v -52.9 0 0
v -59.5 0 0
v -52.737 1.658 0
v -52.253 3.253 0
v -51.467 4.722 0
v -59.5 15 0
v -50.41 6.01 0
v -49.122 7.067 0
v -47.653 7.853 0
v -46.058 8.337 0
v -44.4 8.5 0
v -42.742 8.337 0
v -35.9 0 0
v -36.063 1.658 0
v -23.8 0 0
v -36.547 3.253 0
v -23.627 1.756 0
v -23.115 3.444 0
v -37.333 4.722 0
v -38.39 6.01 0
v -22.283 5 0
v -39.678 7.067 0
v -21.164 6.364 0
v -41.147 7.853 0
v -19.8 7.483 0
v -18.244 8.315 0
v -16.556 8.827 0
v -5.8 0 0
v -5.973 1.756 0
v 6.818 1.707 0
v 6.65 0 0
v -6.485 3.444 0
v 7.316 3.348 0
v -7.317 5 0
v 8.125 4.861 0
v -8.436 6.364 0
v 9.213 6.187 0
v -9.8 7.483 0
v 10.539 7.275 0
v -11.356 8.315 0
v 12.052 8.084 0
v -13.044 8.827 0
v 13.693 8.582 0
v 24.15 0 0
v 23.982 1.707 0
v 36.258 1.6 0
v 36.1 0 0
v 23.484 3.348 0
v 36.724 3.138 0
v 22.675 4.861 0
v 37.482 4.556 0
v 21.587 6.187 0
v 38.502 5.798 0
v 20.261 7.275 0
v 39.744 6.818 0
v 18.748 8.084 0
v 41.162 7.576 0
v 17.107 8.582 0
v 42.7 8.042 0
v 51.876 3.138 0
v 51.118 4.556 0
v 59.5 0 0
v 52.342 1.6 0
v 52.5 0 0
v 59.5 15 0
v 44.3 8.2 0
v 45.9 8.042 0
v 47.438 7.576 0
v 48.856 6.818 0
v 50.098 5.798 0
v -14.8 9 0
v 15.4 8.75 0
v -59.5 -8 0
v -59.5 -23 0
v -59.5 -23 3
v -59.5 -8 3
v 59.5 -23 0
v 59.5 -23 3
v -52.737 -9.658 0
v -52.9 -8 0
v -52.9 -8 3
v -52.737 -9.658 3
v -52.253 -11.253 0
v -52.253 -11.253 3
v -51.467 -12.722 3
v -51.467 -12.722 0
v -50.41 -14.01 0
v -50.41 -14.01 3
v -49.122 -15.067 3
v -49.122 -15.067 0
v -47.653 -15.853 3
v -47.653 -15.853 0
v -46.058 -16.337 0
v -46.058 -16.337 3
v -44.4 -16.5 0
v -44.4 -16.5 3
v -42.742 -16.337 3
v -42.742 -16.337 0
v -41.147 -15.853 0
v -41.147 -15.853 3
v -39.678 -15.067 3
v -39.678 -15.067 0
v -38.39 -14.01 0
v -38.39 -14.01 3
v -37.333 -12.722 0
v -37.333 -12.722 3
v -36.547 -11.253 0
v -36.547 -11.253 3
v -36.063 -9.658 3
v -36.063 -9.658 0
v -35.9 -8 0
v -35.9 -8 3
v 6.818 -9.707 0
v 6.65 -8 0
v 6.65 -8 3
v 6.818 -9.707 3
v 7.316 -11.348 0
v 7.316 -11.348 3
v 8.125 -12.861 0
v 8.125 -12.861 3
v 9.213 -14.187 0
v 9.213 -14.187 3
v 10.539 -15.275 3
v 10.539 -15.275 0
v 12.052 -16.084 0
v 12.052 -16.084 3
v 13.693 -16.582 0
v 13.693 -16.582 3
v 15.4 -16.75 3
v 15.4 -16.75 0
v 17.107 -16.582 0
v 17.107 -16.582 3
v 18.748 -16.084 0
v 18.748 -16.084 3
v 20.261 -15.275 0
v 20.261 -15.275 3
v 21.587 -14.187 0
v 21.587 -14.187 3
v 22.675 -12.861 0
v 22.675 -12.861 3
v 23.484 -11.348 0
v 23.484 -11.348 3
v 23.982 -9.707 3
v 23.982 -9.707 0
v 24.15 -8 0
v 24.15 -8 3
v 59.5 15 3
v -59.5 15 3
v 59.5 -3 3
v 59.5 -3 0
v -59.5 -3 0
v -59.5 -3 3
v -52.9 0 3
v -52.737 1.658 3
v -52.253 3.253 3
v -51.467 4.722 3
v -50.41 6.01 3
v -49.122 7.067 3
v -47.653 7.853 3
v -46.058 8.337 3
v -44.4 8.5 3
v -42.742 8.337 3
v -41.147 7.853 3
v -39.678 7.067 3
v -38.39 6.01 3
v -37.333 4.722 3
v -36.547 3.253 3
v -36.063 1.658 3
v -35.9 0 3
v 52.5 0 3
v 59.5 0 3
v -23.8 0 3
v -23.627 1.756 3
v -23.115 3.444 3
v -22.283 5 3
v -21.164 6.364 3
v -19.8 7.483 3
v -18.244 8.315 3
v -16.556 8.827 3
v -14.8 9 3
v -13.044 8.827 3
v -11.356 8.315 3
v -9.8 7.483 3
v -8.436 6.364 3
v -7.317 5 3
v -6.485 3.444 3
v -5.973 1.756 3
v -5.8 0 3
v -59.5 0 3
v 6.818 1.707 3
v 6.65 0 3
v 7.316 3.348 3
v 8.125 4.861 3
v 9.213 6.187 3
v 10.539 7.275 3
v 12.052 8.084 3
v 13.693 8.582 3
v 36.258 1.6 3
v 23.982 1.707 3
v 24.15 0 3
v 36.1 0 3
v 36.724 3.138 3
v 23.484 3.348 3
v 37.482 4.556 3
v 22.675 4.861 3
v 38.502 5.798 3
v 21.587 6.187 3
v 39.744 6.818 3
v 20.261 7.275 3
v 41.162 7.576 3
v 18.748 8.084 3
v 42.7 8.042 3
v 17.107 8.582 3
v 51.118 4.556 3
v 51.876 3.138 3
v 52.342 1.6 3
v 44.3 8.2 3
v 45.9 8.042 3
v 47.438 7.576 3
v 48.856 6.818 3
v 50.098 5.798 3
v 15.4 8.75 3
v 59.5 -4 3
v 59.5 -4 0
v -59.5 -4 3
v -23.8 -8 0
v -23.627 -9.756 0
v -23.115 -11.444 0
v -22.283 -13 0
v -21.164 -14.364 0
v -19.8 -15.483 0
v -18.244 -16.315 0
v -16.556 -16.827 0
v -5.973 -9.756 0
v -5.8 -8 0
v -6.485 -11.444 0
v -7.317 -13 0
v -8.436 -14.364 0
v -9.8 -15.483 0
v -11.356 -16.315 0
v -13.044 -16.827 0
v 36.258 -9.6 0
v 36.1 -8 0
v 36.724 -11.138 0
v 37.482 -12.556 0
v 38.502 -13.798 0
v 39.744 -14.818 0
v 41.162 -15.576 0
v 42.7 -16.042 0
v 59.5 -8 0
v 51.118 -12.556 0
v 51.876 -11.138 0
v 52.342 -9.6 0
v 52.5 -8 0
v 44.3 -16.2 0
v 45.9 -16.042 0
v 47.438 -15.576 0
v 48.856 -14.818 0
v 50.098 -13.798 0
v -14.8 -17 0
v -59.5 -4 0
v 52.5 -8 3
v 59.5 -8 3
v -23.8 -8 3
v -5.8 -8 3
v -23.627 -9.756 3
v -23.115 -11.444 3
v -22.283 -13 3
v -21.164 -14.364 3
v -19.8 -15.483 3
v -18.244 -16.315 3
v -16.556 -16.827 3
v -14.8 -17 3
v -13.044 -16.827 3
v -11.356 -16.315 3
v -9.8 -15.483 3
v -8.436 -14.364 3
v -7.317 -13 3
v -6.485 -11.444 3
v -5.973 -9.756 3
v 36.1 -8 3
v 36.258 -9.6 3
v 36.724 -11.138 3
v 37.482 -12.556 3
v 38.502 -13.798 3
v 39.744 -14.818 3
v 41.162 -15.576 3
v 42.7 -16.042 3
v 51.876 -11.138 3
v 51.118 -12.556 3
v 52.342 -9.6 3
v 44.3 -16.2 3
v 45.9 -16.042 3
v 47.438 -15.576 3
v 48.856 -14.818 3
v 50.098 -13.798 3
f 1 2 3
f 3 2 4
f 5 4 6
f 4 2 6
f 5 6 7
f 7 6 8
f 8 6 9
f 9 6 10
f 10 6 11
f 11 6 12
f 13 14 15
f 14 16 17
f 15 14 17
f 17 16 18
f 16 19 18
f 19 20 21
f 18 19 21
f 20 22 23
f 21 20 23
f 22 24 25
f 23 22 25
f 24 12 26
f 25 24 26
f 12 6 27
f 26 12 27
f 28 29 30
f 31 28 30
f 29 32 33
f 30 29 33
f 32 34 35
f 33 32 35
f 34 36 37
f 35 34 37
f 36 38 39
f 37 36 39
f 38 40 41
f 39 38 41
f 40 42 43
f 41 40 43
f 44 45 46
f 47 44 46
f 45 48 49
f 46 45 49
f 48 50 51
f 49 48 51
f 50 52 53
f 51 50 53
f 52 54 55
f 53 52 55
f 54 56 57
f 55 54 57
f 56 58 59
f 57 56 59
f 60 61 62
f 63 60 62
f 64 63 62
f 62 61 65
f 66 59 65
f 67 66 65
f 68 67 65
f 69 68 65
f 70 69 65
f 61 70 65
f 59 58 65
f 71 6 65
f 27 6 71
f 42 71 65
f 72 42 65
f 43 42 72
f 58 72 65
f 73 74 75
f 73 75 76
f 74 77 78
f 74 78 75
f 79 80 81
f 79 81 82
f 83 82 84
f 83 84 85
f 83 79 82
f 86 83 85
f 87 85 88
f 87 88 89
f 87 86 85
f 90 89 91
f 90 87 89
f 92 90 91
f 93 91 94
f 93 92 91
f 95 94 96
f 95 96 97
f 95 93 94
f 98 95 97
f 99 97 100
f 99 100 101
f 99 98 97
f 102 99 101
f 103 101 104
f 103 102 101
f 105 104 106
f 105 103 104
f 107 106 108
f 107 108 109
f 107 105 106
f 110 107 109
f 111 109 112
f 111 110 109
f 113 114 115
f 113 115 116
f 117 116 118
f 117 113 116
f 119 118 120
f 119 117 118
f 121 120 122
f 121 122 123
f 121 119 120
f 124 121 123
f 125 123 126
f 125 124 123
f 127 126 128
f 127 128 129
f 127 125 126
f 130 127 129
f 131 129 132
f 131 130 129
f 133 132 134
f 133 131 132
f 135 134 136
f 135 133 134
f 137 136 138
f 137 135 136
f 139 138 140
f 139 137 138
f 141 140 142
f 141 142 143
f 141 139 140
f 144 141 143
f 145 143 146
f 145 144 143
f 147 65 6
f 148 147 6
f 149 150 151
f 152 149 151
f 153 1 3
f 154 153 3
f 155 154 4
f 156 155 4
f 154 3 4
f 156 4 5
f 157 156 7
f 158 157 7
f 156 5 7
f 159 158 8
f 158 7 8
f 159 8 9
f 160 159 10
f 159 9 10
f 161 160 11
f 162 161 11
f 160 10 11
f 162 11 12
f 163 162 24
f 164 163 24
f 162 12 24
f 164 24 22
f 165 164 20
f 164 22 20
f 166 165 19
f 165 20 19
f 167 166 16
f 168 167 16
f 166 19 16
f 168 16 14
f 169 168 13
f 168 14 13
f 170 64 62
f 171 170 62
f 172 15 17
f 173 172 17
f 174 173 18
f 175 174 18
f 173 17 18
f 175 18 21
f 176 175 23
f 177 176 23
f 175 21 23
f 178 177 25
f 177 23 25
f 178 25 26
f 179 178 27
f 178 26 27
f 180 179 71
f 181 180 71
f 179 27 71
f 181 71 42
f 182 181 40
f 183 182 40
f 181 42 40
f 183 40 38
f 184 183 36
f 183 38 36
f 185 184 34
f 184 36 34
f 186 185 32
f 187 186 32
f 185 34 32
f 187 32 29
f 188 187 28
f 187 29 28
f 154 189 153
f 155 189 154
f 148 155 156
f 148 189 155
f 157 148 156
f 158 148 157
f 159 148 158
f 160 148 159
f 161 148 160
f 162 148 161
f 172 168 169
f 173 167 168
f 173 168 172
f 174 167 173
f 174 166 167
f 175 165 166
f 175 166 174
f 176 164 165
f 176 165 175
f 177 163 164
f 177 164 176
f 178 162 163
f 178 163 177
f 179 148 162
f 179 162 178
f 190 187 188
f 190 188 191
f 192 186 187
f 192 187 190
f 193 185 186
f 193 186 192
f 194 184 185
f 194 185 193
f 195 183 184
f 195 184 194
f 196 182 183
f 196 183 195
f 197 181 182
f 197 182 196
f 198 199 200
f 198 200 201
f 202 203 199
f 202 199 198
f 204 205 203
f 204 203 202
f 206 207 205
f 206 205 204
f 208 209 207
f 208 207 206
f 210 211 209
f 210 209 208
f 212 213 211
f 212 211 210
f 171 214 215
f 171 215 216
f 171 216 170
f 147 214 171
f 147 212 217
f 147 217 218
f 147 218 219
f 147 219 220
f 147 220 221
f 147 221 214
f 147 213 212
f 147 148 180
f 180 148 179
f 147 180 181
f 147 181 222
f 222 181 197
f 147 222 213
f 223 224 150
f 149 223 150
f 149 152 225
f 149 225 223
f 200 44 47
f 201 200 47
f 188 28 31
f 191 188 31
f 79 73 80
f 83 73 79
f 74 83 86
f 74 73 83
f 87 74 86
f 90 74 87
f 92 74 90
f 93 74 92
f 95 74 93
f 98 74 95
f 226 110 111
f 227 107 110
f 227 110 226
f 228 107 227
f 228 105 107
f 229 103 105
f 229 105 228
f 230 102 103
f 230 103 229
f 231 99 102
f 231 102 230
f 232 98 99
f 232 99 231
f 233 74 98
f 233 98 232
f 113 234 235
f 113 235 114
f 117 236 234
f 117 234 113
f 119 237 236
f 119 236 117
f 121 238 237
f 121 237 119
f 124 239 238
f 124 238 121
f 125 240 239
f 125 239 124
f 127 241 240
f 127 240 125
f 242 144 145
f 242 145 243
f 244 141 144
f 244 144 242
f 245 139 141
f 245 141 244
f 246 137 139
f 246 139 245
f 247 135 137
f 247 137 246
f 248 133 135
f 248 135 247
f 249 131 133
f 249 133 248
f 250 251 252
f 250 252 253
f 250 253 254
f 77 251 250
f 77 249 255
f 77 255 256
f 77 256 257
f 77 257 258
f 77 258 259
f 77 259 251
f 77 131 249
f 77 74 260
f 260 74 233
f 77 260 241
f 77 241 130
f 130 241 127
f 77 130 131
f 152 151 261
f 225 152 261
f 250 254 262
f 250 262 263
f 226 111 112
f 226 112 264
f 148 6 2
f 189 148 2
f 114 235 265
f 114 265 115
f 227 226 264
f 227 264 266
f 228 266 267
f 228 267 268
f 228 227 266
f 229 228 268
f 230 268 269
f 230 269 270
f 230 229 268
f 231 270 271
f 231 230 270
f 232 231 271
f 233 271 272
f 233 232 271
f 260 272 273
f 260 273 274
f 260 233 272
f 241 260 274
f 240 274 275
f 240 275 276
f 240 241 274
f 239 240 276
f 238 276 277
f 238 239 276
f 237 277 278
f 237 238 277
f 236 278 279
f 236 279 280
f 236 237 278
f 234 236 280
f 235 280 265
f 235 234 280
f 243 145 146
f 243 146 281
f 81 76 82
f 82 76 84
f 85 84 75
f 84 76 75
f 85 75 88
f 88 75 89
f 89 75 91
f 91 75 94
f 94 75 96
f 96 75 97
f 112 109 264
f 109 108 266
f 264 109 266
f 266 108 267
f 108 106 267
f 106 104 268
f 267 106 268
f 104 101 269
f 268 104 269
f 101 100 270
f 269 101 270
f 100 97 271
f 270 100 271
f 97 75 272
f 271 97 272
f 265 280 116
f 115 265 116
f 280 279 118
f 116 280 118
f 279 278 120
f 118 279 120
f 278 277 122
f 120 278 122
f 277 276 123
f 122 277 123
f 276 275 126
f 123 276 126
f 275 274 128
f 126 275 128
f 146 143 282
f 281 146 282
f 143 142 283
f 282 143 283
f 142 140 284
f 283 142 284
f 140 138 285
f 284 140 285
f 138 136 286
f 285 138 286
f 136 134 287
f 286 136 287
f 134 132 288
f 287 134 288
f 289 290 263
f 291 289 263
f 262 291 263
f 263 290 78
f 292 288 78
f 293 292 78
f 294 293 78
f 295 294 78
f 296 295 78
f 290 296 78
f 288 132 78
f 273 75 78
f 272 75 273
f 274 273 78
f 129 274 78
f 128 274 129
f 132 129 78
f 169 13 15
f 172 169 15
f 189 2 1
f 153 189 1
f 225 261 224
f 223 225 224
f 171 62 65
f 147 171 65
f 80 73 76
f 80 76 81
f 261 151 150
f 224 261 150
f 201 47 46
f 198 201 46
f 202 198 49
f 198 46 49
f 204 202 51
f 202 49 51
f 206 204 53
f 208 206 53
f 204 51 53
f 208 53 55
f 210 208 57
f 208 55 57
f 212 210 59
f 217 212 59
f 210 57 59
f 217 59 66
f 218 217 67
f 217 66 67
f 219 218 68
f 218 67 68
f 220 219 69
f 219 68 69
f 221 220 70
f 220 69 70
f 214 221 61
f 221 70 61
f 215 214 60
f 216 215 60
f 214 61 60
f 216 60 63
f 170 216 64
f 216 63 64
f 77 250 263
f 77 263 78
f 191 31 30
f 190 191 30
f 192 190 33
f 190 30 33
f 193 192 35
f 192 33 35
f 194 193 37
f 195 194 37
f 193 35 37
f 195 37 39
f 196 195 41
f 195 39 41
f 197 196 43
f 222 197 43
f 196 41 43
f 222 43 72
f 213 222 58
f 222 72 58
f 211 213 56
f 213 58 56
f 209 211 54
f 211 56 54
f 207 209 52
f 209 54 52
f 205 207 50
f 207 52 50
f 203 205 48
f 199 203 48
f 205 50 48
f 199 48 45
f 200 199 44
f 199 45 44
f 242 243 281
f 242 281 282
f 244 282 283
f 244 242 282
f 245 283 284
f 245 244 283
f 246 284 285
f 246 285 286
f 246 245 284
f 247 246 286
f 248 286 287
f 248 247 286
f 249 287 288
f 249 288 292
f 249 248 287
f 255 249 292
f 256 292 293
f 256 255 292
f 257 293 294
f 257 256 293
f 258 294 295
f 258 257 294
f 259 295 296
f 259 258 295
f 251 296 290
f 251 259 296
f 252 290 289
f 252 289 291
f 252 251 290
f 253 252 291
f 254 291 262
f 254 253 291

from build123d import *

# Parameters (mm, degrees)
F1_DEPTH = 3


with BuildPart() as f1:
    # F0 (on Top) → F1 (new body)
    with BuildSketch(Plane.XY):
        with BuildLine():
            Line((59.5, 0), (59.5, 15))
            Line((59.5, 15), (-59.5, 15))
            Line((-59.5, 15), (-59.5, 0))
            Line((-59.5, 0), (-57.9, 0))
            Line((-57.9, 0), (-52.9, 0))
            ThreePointArc((-52.9, 0), (-44.4, 8.5), (-35.9, 0))
            Line((-35.9, 0), (-30.9, 0))
            Line((-30.9, 0), (-29.3, 0))
            Line((-29.3, 0), (-23.8, 0))
            ThreePointArc((-23.8, 0), (-14.8, 9), (-5.8, 0))
            Line((-5.8, 0), (-0.3, 0))
            Line((-0.3, 0), (1.3, 0))
            Line((1.3, 0), (6.65, 0))
            ThreePointArc((6.65, 0), (15.4, 8.75), (24.15, 0))
            Line((24.15, 0), (29.5, 0))
            Line((29.5, 0), (31.1, 0))
            Line((31.1, 0), (36.1, 0))
            ThreePointArc((36.1, 0), (44.3, 8.2), (52.5, 0))
            Line((52.5, 0), (57.5, 0))
            Line((57.5, 0), (59.5, 0))
        make_face()
    extrude(amount=F1_DEPTH)


with BuildPart() as f1b:
    # F0 (on Top) → F1, piece 2 (new body)
    with BuildSketch(Plane.XY):
        Polygon((59.5, -4), (59.5, -3), (-57.9, -3), (-59.5, -3), (-59.5, -4), align=None)
    extrude(amount=F1_DEPTH)


with BuildPart() as f2_1:
    # F2: instance of F1
    add(f1.part.mirror(Plane(origin=(0, -4, 1.5), x_dir=(1, 0, 0), z_dir=(0, -1, 0))))


solid = Compound([f1.part, f1b.part, f2_1.part])
